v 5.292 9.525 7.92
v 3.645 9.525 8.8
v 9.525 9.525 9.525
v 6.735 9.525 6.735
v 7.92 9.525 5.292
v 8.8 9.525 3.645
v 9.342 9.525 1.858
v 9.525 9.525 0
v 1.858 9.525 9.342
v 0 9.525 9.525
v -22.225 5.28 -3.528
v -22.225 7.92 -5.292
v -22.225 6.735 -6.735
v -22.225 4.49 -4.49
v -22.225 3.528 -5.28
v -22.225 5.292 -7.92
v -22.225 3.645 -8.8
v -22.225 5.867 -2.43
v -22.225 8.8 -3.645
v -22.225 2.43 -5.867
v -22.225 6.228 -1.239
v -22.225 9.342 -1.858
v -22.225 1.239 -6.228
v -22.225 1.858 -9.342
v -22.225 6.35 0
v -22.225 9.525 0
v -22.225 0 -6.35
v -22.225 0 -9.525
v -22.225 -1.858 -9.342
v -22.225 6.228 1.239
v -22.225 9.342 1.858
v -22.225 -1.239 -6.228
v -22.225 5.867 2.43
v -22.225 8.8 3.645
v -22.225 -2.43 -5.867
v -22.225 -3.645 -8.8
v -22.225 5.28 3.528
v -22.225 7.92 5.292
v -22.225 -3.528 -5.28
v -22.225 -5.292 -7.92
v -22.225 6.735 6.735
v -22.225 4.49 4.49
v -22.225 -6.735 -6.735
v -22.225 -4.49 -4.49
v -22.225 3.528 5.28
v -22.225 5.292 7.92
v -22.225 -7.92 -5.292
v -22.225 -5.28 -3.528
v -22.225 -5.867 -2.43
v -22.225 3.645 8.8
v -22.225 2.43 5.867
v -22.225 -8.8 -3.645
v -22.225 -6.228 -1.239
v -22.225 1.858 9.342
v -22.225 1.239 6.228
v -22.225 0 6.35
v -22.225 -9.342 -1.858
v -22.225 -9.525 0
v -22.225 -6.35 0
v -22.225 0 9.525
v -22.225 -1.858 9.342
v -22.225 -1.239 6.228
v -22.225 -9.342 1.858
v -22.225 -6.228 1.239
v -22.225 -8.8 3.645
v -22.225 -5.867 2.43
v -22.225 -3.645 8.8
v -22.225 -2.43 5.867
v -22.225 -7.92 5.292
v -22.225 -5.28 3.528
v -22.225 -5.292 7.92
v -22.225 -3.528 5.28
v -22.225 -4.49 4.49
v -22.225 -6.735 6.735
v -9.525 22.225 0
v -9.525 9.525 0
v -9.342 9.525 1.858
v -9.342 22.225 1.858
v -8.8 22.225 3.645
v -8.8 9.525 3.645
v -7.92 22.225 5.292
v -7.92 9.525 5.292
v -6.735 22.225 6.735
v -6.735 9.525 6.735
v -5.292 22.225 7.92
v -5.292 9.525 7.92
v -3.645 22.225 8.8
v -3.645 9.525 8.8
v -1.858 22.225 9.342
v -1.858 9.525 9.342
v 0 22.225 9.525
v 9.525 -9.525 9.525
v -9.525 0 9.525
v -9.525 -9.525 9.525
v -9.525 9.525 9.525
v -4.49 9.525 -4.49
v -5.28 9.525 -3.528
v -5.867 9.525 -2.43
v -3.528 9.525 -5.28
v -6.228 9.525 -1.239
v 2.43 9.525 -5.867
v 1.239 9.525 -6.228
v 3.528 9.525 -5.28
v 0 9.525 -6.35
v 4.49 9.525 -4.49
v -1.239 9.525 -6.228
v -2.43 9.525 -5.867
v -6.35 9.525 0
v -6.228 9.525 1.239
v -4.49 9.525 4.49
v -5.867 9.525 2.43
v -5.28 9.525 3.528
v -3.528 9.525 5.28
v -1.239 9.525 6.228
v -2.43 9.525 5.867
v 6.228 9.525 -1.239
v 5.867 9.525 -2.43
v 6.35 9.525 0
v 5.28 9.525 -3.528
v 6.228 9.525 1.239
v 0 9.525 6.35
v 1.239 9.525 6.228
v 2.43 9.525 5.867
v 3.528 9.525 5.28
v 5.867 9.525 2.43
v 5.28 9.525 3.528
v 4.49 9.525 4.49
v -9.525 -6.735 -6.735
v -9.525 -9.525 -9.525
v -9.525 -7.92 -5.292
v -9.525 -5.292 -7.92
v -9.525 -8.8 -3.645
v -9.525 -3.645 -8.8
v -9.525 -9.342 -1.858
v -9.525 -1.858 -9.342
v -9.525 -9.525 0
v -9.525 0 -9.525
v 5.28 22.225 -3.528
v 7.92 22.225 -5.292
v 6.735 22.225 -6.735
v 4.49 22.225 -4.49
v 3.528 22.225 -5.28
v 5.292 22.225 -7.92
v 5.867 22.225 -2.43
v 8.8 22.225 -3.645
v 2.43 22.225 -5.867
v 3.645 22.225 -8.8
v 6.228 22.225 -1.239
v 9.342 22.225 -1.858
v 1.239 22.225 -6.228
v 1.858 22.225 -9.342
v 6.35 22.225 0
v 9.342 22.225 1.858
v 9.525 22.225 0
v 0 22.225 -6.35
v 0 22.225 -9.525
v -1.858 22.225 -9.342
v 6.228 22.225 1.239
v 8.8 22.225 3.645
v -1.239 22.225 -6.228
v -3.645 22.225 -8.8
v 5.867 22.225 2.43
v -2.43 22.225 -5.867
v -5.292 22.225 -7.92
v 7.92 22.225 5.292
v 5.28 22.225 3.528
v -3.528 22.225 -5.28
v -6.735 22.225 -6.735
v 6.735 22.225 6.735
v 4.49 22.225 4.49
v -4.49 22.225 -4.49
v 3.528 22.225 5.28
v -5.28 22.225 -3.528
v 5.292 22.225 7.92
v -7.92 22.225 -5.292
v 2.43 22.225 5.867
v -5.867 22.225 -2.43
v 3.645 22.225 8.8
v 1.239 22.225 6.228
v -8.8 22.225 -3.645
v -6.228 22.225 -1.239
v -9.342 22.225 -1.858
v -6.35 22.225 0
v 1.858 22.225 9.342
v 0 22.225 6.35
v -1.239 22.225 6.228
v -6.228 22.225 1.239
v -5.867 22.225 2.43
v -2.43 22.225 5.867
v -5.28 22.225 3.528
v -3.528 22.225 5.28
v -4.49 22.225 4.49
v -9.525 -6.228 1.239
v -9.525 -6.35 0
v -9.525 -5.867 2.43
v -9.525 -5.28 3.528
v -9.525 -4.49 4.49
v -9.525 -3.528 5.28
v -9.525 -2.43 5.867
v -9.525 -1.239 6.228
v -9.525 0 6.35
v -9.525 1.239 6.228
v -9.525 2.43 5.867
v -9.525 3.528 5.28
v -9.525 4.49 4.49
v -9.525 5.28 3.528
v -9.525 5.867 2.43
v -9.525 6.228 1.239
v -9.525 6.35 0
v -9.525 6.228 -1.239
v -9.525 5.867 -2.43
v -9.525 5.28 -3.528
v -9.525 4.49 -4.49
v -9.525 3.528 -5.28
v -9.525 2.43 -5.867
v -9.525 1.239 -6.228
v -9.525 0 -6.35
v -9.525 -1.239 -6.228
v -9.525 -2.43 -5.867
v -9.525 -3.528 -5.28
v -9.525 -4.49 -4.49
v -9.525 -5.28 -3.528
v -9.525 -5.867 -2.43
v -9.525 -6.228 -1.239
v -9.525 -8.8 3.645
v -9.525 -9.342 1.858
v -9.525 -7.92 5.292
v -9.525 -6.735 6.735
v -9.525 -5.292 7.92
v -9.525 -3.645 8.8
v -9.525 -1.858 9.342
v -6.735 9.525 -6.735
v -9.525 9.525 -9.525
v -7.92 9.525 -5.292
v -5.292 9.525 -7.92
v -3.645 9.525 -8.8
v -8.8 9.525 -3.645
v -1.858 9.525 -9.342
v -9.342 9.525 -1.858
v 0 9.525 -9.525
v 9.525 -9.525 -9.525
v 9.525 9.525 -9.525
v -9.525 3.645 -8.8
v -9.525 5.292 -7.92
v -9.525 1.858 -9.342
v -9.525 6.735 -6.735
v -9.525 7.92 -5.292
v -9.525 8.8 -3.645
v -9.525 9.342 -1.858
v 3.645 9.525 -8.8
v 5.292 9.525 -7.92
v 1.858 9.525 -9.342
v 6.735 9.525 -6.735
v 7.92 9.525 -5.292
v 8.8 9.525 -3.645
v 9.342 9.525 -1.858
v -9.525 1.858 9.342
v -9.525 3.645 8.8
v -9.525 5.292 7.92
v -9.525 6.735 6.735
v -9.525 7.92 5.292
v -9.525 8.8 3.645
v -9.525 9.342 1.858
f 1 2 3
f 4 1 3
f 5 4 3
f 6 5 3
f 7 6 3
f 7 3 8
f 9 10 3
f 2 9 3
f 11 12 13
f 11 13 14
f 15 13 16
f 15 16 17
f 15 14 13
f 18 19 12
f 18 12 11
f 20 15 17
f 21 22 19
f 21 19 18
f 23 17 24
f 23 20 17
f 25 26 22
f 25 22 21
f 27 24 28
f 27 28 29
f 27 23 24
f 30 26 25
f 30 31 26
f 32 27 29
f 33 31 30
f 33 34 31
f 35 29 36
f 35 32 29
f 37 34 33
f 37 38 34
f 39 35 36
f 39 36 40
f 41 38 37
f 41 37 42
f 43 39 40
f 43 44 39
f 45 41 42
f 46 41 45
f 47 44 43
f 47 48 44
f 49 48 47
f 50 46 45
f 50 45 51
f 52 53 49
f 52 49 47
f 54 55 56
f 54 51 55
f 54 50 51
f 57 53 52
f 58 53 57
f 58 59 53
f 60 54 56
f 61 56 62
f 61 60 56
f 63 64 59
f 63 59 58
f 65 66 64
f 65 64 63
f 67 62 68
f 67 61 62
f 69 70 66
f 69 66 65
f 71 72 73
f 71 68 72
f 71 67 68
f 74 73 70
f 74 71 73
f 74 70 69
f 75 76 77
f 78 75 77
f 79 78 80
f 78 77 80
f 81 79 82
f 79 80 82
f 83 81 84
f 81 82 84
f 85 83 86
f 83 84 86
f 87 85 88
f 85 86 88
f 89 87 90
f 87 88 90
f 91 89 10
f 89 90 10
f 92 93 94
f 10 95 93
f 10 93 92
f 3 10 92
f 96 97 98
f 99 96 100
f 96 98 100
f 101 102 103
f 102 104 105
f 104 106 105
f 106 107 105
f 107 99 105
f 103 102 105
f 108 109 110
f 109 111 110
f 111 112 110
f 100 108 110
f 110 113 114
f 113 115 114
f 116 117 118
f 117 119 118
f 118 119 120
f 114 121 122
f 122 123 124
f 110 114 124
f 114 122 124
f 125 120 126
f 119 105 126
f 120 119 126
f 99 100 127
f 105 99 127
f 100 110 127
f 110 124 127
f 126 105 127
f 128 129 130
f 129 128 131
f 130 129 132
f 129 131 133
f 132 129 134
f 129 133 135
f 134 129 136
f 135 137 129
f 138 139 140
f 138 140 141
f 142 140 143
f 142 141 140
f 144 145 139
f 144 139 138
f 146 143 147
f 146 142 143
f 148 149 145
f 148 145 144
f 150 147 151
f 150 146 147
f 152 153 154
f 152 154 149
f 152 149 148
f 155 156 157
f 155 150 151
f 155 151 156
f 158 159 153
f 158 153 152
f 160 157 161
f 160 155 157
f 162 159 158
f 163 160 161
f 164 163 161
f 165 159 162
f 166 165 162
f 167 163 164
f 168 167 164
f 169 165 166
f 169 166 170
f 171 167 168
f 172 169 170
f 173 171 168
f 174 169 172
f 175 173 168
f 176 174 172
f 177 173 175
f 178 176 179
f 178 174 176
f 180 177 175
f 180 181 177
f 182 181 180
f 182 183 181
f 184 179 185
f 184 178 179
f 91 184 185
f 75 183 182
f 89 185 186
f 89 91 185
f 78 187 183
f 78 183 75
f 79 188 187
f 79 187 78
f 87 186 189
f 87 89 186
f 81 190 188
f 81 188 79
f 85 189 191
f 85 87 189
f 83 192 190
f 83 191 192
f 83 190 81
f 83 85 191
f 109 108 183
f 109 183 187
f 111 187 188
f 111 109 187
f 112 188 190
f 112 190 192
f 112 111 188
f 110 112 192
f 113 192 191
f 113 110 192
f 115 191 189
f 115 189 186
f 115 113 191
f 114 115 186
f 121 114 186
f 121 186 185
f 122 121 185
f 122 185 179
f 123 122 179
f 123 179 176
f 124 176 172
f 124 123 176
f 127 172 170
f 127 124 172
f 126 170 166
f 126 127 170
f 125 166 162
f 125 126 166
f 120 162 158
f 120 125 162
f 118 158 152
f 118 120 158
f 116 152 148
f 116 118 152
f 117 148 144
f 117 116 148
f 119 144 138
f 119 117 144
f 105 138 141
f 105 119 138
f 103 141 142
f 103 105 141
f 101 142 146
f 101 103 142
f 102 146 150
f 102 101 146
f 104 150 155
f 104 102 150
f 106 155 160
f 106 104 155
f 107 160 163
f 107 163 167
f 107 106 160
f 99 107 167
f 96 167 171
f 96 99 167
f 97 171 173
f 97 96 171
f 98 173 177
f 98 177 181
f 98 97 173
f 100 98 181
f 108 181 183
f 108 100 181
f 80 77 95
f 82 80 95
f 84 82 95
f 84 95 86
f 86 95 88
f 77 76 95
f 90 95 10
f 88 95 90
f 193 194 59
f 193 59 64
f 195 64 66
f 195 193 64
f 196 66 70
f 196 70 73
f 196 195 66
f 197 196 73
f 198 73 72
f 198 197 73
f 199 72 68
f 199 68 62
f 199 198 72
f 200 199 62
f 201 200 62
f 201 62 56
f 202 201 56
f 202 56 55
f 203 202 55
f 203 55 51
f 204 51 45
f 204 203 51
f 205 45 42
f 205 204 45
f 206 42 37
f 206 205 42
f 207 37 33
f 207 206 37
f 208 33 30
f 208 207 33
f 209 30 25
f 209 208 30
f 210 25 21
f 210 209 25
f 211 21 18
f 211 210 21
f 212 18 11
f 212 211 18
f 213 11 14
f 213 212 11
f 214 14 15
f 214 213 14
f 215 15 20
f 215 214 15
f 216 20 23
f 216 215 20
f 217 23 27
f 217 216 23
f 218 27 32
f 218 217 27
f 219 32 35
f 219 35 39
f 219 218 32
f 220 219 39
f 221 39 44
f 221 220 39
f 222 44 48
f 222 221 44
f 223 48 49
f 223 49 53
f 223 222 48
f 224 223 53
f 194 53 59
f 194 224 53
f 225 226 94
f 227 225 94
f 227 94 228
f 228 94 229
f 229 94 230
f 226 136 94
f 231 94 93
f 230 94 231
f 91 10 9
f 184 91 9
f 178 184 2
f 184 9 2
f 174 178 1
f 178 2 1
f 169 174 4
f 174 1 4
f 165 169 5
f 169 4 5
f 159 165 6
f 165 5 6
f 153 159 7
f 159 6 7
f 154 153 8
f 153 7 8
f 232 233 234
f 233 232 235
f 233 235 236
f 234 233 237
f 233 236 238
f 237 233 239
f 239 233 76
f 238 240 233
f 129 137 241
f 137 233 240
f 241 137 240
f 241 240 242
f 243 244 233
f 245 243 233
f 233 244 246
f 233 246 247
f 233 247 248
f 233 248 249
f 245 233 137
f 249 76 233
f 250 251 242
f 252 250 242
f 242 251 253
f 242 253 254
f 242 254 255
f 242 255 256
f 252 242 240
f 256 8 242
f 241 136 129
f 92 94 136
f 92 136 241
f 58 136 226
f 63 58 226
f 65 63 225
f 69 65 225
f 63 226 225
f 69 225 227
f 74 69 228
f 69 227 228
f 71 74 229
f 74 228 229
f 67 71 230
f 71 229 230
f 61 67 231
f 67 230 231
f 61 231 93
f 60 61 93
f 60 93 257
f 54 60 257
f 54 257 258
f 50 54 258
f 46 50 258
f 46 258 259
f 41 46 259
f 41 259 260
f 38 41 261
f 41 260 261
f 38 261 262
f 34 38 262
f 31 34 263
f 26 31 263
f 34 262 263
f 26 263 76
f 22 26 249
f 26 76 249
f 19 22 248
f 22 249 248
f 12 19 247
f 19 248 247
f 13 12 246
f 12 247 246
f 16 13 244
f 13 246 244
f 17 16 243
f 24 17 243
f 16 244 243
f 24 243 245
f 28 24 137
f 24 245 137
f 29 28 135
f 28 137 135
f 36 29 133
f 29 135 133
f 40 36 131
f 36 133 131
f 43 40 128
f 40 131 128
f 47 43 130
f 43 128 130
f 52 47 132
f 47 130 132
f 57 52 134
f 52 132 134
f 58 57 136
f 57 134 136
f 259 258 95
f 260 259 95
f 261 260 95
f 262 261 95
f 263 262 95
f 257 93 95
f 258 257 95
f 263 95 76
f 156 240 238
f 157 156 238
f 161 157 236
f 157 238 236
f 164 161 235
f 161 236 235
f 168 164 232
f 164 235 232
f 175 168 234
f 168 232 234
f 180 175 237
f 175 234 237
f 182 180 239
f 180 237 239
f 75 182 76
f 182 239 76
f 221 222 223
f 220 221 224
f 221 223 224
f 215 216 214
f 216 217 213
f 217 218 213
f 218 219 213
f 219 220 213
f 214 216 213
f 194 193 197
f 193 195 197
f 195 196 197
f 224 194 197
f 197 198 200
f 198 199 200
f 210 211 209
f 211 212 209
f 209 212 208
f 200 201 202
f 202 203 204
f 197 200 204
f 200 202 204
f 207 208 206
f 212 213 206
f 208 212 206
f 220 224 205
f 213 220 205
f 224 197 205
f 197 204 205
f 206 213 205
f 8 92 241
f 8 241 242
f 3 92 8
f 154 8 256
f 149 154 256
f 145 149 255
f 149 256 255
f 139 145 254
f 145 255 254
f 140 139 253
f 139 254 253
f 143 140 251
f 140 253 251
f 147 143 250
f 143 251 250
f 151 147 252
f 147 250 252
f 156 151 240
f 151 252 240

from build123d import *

# Parameters (mm, degrees)
F0_W     = 19.05
F0_H     = 19.05
F1_DEPTH = 9.525
F2_R     = 6.35
F3_DEPTH = 12.7
F4_R     = 9.525
F4_R_2   = 6.35
F5_DEPTH = 12.7


with BuildPart() as f1:
    # F0 (on Top) → F1 (new body, symmetric)
    with BuildSketch(Plane.XY):
        Rectangle(F0_W, F0_H)
    extrude(amount=F1_DEPTH, both=True)

    # F2 (on face) → F3 (join)
    with BuildSketch(Plane(origin=(0, 9.525, 0), x_dir=(-1, 0, 0), z_dir=(0, 1, 0))):
        with BuildLine():
            ThreePointArc((0, -9.525), (6.7351920908, -6.7351920908), (9.525, 0))
            ThreePointArc((9.525, 0), (6.7351920908, 6.7351920908), (0, 9.525))
            ThreePointArc((0, 9.525), (-6.7351920908, 6.7351920908), (-9.525, 0))
            ThreePointArc((-9.525, 0), (-6.7351920908, -6.7351920908), (0, -9.525))
        make_face()
        Circle(F2_R, mode=Mode.SUBTRACT)
    extrude(amount=F3_DEPTH)

    # F4 (on face) → F5 (join)
    with BuildSketch(Plane(origin=(-9.525, 0, 0), x_dir=(0, -1, 0), z_dir=(-1, 0, 0))):
        Circle(F4_R)
        Circle(F4_R_2, mode=Mode.SUBTRACT)
    extrude(amount=F5_DEPTH)


solid = f1.part
